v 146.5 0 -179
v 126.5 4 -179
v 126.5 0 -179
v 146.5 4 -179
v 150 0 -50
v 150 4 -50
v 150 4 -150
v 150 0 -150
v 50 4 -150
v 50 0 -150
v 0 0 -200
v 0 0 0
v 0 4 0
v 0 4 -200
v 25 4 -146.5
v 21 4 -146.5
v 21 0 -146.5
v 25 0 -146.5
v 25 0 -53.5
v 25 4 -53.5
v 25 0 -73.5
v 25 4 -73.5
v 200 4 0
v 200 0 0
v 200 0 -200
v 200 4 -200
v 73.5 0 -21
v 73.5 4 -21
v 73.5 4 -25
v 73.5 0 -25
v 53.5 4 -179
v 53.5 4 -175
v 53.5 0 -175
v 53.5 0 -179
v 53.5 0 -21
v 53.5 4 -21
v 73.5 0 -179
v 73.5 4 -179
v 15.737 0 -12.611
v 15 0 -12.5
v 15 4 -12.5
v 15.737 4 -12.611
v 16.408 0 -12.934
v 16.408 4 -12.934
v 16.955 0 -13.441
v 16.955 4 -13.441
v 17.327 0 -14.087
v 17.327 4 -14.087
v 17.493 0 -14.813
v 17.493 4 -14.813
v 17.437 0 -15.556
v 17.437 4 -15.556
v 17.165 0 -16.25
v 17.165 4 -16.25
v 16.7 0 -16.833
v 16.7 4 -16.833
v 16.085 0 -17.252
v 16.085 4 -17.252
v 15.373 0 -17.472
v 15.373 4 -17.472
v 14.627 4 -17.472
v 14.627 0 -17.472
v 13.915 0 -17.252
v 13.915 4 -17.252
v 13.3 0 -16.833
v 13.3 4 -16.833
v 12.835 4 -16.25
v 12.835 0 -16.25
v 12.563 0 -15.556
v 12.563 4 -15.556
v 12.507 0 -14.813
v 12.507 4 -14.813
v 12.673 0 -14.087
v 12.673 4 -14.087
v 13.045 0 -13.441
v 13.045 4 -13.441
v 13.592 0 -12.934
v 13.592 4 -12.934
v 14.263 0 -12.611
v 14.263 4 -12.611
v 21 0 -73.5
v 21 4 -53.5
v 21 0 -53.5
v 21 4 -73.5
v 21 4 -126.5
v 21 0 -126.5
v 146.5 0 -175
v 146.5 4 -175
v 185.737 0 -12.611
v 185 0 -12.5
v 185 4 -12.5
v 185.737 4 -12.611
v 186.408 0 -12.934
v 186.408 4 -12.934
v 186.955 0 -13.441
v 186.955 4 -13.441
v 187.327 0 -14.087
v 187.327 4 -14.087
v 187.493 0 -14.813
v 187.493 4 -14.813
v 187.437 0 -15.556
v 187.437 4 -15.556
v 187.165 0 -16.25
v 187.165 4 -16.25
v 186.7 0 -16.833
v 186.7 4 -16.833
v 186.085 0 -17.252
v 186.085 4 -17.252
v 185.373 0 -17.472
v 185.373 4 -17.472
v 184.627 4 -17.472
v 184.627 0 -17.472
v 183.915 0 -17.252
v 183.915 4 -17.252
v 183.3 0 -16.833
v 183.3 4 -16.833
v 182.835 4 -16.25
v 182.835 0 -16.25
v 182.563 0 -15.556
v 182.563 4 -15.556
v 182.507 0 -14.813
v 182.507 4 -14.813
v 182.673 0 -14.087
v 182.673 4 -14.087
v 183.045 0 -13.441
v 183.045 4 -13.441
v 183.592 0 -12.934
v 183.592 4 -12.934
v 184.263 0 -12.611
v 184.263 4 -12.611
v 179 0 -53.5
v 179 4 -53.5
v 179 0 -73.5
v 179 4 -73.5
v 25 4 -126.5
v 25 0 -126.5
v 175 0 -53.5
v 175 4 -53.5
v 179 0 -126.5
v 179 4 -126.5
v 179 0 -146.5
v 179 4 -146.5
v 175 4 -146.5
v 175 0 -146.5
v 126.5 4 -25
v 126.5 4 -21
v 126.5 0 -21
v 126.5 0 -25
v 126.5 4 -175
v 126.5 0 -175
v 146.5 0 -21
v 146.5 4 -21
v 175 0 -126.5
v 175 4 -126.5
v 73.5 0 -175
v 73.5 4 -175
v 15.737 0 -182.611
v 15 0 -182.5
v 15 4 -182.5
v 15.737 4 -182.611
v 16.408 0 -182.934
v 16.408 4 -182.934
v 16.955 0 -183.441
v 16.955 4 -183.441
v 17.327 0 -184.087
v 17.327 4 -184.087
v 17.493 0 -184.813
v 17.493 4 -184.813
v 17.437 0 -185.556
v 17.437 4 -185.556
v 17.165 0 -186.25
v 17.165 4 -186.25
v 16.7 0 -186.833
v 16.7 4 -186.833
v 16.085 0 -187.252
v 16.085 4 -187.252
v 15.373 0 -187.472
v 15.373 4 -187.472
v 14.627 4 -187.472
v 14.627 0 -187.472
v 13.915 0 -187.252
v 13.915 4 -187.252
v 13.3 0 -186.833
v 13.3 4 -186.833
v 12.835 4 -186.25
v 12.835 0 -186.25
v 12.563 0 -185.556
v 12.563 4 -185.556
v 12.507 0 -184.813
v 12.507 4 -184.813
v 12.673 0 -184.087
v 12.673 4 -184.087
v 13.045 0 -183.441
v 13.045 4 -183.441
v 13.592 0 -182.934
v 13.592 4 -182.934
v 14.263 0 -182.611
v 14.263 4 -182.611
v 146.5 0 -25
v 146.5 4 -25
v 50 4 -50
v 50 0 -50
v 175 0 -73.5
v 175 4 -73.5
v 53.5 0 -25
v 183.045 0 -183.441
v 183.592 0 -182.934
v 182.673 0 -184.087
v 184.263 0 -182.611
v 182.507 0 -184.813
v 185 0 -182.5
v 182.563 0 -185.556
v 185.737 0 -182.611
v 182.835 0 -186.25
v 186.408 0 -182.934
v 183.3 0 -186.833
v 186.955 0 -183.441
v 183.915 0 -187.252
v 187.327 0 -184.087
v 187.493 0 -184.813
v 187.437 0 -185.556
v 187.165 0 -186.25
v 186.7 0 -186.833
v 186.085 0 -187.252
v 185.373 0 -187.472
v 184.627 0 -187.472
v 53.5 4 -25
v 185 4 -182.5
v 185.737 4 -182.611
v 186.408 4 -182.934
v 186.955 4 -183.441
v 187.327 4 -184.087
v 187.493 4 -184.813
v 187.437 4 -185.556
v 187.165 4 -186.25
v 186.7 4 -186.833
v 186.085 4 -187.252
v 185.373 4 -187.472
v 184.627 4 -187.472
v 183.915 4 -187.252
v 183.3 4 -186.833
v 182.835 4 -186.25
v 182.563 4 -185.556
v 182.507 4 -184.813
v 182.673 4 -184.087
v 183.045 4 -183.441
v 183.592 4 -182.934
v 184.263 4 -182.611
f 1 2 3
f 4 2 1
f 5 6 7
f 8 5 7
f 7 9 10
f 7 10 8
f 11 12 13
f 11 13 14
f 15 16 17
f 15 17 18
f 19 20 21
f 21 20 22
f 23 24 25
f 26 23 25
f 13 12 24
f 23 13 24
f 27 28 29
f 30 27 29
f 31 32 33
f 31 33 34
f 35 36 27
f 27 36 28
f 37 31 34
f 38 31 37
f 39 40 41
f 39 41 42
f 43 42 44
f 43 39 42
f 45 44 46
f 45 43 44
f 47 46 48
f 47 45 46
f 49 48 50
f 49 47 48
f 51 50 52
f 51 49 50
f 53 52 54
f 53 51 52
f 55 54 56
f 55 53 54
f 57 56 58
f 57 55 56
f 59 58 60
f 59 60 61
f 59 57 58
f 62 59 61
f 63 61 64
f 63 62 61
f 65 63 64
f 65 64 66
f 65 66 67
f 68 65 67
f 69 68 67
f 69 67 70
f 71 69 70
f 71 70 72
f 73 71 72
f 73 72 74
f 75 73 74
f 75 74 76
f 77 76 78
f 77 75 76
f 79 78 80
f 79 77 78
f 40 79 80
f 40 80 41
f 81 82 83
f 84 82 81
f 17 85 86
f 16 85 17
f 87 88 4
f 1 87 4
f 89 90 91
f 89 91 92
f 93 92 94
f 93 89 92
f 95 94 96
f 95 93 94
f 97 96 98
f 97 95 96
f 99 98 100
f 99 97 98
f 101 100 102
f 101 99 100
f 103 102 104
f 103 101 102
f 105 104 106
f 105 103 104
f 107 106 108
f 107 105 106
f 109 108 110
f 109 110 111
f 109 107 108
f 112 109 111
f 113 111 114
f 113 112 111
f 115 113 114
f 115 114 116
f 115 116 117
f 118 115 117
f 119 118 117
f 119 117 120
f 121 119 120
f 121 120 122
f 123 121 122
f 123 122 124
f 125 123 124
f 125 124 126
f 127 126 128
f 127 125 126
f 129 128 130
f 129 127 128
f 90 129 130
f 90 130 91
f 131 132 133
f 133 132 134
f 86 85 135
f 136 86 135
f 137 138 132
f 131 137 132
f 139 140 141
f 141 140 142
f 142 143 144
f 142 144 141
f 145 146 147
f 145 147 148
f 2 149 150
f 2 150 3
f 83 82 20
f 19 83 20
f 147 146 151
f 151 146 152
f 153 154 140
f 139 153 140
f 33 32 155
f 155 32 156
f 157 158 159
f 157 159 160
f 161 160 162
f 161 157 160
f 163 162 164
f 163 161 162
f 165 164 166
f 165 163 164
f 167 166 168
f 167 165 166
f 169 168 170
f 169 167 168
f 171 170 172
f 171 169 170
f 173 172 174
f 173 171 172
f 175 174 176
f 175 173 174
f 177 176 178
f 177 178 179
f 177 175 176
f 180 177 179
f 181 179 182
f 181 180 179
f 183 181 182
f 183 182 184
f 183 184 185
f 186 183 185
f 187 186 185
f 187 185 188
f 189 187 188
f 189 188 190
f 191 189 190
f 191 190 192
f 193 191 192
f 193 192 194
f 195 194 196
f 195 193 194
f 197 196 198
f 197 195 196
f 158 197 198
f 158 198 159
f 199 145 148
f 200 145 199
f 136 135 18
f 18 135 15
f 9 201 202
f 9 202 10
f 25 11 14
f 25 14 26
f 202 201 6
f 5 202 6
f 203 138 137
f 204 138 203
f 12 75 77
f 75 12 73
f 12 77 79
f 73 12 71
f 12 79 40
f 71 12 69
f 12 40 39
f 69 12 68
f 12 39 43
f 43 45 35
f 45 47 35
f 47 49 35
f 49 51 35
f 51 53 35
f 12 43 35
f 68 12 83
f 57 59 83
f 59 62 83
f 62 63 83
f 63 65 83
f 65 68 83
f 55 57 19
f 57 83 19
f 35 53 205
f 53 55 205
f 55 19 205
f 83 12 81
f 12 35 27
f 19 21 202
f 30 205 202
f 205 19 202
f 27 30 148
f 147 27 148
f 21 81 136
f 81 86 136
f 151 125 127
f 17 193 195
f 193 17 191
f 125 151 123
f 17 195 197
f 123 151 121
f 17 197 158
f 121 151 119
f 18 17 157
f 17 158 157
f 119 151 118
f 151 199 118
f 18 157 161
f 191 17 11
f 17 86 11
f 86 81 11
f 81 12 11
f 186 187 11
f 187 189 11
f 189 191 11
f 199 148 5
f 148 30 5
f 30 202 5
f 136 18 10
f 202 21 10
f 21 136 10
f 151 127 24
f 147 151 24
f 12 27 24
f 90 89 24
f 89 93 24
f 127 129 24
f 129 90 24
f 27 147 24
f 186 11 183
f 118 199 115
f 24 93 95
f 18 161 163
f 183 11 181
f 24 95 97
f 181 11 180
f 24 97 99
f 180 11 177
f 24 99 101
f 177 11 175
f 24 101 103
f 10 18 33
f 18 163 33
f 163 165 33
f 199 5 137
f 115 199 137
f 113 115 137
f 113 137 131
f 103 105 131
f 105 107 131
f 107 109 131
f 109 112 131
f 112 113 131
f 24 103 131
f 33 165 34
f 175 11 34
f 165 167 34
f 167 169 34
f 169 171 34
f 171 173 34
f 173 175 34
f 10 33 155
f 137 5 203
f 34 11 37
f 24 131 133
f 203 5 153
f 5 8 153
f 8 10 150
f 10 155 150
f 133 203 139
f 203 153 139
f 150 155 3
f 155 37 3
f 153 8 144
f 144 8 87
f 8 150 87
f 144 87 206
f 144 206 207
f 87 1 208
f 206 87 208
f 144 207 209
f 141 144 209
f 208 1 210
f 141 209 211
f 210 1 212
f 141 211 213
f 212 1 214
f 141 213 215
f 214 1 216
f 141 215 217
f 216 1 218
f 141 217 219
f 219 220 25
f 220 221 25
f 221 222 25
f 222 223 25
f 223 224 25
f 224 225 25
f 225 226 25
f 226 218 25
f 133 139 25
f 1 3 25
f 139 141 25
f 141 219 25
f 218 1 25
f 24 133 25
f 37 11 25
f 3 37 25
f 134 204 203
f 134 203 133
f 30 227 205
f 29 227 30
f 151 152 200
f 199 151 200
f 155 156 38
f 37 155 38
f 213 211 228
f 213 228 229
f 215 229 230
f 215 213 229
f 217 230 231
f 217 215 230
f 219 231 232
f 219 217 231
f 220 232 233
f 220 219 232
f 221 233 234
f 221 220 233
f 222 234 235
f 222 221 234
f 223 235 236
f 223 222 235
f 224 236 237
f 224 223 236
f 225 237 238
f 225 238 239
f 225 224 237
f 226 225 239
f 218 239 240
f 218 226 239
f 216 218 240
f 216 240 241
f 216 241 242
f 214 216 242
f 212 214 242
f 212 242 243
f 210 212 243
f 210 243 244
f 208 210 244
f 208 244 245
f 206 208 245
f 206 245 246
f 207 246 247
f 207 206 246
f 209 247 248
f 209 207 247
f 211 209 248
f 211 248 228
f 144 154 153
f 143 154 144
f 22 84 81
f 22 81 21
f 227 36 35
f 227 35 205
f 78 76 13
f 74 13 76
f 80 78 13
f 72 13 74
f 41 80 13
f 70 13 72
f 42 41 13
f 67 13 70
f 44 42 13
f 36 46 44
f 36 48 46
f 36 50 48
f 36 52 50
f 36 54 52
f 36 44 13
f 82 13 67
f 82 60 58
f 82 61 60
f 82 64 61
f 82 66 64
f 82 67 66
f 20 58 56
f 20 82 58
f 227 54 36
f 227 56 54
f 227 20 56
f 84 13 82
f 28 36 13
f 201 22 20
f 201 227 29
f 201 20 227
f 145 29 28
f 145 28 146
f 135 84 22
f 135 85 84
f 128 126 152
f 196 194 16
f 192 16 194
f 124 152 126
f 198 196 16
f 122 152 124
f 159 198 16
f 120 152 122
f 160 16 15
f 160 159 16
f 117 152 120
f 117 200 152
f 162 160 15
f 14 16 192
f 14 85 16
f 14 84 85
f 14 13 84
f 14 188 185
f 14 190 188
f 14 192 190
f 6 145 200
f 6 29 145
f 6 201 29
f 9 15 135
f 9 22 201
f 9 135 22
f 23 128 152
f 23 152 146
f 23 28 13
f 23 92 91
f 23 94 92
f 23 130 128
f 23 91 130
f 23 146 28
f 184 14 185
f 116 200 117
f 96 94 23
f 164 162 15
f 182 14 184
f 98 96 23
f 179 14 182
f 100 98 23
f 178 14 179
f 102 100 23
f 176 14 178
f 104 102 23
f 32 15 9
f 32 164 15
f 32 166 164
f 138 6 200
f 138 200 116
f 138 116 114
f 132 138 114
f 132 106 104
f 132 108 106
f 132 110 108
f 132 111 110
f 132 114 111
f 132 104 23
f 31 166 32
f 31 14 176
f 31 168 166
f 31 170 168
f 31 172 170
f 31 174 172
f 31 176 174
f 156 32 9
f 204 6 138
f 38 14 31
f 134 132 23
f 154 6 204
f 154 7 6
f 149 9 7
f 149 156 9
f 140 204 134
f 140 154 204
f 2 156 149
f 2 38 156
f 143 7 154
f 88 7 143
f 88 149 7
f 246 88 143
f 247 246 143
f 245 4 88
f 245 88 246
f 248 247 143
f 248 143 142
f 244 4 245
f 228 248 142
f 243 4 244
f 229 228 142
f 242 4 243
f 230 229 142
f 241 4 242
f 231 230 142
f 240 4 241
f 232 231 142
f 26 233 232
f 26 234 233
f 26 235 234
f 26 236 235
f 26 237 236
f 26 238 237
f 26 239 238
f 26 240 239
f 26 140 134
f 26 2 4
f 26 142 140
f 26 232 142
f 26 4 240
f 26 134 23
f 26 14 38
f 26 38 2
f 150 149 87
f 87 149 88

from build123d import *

# Parameters (mm, degrees)
CROQUIS1_W              = 200
CROQUIS1_H              = 200
CROQUIS1_R              = 2.5
SALIENTE_EXTRUIR1_DEPTH = 4
CROQUIS2_W              = 150
CROQUIS2_H              = 150
CROQUIS2_W_2            = 4
CROQUIS2_H_2            = 20
CROQUIS2_W_3            = 20
CROQUIS2_H_3            = 4
CORTAR_EXTRUIR1_DEPTH   = 4
CROQUIS3_W              = 150
CROQUIS3_H              = 150
CROQUIS3_W_2            = 100
CROQUIS3_H_2            = 100
SALIENTE_EXTRUIR2_DEPTH = 4


with BuildPart() as part:
    # Croquis1 → Saliente-Extruir1 (new body)
    with BuildSketch(Plane(origin=(0, 0, 0), x_dir=(1, 0, 0), z_dir=(0, 1, 0))):
        with Locations((100, 100)):
            Rectangle(CROQUIS1_W, CROQUIS1_H)
        with Locations(Location((15, 185, 0), (0, 0, 270))):
            Circle(CROQUIS1_R, mode=Mode.SUBTRACT)
        with Locations(Location((185, 185, 0), (0, 0, 270))):
            Circle(CROQUIS1_R, mode=Mode.SUBTRACT)
        with Locations(Location((185, 15, 0), (0, 0, 270))):
            Circle(CROQUIS1_R, mode=Mode.SUBTRACT)
        with Locations(Location((15, 15, 0), (0, 0, 270))):
            Circle(CROQUIS1_R, mode=Mode.SUBTRACT)
    extrude(amount=SALIENTE_EXTRUIR1_DEPTH)

    # Croquis2 → Cortar-Extruir1 (cut)
    with BuildSketch(Plane(origin=(0, 4, 0), x_dir=(1, 0, 0), z_dir=(0, 1, 0))):
        with Locations((100, 100)):
            Rectangle(CROQUIS2_W, CROQUIS2_H)
        with Locations((23, 136.5)):
            Rectangle(CROQUIS2_W_2, CROQUIS2_H_2)
        with Locations((63.5, 177)):
            Rectangle(CROQUIS2_W_3, CROQUIS2_H_3)
        with Locations((177, 136.5)):
            Rectangle(CROQUIS2_W_2, CROQUIS2_H_2)
        with Locations((136.5, 177)):
            Rectangle(CROQUIS2_W_3, CROQUIS2_H_3)
        with Locations((136.5, 23)):
            Rectangle(CROQUIS2_W_3, CROQUIS2_H_3)
        with Locations((177, 63.5)):
            Rectangle(CROQUIS2_W_2, CROQUIS2_H_2)
        with Locations((23, 63.5)):
            Rectangle(CROQUIS2_W_2, CROQUIS2_H_2)
        with Locations((63.5, 23)):
            Rectangle(CROQUIS2_W_3, CROQUIS2_H_3)
    extrude(amount=-CORTAR_EXTRUIR1_DEPTH, mode=Mode.SUBTRACT)

    # Croquis3 → Saliente-Extruir2 (add)
    with BuildSketch(Plane(origin=(0, 4, 0), x_dir=(1, 0, 0), z_dir=(0, 1, 0))):
        with Locations((100, 100)):
            Rectangle(CROQUIS3_W, CROQUIS3_H)
        with Locations((100, 100)):
            Rectangle(CROQUIS3_W_2, CROQUIS3_H_2, mode=Mode.SUBTRACT)
    extrude(amount=-SALIENTE_EXTRUIR2_DEPTH)


solid = part.part
